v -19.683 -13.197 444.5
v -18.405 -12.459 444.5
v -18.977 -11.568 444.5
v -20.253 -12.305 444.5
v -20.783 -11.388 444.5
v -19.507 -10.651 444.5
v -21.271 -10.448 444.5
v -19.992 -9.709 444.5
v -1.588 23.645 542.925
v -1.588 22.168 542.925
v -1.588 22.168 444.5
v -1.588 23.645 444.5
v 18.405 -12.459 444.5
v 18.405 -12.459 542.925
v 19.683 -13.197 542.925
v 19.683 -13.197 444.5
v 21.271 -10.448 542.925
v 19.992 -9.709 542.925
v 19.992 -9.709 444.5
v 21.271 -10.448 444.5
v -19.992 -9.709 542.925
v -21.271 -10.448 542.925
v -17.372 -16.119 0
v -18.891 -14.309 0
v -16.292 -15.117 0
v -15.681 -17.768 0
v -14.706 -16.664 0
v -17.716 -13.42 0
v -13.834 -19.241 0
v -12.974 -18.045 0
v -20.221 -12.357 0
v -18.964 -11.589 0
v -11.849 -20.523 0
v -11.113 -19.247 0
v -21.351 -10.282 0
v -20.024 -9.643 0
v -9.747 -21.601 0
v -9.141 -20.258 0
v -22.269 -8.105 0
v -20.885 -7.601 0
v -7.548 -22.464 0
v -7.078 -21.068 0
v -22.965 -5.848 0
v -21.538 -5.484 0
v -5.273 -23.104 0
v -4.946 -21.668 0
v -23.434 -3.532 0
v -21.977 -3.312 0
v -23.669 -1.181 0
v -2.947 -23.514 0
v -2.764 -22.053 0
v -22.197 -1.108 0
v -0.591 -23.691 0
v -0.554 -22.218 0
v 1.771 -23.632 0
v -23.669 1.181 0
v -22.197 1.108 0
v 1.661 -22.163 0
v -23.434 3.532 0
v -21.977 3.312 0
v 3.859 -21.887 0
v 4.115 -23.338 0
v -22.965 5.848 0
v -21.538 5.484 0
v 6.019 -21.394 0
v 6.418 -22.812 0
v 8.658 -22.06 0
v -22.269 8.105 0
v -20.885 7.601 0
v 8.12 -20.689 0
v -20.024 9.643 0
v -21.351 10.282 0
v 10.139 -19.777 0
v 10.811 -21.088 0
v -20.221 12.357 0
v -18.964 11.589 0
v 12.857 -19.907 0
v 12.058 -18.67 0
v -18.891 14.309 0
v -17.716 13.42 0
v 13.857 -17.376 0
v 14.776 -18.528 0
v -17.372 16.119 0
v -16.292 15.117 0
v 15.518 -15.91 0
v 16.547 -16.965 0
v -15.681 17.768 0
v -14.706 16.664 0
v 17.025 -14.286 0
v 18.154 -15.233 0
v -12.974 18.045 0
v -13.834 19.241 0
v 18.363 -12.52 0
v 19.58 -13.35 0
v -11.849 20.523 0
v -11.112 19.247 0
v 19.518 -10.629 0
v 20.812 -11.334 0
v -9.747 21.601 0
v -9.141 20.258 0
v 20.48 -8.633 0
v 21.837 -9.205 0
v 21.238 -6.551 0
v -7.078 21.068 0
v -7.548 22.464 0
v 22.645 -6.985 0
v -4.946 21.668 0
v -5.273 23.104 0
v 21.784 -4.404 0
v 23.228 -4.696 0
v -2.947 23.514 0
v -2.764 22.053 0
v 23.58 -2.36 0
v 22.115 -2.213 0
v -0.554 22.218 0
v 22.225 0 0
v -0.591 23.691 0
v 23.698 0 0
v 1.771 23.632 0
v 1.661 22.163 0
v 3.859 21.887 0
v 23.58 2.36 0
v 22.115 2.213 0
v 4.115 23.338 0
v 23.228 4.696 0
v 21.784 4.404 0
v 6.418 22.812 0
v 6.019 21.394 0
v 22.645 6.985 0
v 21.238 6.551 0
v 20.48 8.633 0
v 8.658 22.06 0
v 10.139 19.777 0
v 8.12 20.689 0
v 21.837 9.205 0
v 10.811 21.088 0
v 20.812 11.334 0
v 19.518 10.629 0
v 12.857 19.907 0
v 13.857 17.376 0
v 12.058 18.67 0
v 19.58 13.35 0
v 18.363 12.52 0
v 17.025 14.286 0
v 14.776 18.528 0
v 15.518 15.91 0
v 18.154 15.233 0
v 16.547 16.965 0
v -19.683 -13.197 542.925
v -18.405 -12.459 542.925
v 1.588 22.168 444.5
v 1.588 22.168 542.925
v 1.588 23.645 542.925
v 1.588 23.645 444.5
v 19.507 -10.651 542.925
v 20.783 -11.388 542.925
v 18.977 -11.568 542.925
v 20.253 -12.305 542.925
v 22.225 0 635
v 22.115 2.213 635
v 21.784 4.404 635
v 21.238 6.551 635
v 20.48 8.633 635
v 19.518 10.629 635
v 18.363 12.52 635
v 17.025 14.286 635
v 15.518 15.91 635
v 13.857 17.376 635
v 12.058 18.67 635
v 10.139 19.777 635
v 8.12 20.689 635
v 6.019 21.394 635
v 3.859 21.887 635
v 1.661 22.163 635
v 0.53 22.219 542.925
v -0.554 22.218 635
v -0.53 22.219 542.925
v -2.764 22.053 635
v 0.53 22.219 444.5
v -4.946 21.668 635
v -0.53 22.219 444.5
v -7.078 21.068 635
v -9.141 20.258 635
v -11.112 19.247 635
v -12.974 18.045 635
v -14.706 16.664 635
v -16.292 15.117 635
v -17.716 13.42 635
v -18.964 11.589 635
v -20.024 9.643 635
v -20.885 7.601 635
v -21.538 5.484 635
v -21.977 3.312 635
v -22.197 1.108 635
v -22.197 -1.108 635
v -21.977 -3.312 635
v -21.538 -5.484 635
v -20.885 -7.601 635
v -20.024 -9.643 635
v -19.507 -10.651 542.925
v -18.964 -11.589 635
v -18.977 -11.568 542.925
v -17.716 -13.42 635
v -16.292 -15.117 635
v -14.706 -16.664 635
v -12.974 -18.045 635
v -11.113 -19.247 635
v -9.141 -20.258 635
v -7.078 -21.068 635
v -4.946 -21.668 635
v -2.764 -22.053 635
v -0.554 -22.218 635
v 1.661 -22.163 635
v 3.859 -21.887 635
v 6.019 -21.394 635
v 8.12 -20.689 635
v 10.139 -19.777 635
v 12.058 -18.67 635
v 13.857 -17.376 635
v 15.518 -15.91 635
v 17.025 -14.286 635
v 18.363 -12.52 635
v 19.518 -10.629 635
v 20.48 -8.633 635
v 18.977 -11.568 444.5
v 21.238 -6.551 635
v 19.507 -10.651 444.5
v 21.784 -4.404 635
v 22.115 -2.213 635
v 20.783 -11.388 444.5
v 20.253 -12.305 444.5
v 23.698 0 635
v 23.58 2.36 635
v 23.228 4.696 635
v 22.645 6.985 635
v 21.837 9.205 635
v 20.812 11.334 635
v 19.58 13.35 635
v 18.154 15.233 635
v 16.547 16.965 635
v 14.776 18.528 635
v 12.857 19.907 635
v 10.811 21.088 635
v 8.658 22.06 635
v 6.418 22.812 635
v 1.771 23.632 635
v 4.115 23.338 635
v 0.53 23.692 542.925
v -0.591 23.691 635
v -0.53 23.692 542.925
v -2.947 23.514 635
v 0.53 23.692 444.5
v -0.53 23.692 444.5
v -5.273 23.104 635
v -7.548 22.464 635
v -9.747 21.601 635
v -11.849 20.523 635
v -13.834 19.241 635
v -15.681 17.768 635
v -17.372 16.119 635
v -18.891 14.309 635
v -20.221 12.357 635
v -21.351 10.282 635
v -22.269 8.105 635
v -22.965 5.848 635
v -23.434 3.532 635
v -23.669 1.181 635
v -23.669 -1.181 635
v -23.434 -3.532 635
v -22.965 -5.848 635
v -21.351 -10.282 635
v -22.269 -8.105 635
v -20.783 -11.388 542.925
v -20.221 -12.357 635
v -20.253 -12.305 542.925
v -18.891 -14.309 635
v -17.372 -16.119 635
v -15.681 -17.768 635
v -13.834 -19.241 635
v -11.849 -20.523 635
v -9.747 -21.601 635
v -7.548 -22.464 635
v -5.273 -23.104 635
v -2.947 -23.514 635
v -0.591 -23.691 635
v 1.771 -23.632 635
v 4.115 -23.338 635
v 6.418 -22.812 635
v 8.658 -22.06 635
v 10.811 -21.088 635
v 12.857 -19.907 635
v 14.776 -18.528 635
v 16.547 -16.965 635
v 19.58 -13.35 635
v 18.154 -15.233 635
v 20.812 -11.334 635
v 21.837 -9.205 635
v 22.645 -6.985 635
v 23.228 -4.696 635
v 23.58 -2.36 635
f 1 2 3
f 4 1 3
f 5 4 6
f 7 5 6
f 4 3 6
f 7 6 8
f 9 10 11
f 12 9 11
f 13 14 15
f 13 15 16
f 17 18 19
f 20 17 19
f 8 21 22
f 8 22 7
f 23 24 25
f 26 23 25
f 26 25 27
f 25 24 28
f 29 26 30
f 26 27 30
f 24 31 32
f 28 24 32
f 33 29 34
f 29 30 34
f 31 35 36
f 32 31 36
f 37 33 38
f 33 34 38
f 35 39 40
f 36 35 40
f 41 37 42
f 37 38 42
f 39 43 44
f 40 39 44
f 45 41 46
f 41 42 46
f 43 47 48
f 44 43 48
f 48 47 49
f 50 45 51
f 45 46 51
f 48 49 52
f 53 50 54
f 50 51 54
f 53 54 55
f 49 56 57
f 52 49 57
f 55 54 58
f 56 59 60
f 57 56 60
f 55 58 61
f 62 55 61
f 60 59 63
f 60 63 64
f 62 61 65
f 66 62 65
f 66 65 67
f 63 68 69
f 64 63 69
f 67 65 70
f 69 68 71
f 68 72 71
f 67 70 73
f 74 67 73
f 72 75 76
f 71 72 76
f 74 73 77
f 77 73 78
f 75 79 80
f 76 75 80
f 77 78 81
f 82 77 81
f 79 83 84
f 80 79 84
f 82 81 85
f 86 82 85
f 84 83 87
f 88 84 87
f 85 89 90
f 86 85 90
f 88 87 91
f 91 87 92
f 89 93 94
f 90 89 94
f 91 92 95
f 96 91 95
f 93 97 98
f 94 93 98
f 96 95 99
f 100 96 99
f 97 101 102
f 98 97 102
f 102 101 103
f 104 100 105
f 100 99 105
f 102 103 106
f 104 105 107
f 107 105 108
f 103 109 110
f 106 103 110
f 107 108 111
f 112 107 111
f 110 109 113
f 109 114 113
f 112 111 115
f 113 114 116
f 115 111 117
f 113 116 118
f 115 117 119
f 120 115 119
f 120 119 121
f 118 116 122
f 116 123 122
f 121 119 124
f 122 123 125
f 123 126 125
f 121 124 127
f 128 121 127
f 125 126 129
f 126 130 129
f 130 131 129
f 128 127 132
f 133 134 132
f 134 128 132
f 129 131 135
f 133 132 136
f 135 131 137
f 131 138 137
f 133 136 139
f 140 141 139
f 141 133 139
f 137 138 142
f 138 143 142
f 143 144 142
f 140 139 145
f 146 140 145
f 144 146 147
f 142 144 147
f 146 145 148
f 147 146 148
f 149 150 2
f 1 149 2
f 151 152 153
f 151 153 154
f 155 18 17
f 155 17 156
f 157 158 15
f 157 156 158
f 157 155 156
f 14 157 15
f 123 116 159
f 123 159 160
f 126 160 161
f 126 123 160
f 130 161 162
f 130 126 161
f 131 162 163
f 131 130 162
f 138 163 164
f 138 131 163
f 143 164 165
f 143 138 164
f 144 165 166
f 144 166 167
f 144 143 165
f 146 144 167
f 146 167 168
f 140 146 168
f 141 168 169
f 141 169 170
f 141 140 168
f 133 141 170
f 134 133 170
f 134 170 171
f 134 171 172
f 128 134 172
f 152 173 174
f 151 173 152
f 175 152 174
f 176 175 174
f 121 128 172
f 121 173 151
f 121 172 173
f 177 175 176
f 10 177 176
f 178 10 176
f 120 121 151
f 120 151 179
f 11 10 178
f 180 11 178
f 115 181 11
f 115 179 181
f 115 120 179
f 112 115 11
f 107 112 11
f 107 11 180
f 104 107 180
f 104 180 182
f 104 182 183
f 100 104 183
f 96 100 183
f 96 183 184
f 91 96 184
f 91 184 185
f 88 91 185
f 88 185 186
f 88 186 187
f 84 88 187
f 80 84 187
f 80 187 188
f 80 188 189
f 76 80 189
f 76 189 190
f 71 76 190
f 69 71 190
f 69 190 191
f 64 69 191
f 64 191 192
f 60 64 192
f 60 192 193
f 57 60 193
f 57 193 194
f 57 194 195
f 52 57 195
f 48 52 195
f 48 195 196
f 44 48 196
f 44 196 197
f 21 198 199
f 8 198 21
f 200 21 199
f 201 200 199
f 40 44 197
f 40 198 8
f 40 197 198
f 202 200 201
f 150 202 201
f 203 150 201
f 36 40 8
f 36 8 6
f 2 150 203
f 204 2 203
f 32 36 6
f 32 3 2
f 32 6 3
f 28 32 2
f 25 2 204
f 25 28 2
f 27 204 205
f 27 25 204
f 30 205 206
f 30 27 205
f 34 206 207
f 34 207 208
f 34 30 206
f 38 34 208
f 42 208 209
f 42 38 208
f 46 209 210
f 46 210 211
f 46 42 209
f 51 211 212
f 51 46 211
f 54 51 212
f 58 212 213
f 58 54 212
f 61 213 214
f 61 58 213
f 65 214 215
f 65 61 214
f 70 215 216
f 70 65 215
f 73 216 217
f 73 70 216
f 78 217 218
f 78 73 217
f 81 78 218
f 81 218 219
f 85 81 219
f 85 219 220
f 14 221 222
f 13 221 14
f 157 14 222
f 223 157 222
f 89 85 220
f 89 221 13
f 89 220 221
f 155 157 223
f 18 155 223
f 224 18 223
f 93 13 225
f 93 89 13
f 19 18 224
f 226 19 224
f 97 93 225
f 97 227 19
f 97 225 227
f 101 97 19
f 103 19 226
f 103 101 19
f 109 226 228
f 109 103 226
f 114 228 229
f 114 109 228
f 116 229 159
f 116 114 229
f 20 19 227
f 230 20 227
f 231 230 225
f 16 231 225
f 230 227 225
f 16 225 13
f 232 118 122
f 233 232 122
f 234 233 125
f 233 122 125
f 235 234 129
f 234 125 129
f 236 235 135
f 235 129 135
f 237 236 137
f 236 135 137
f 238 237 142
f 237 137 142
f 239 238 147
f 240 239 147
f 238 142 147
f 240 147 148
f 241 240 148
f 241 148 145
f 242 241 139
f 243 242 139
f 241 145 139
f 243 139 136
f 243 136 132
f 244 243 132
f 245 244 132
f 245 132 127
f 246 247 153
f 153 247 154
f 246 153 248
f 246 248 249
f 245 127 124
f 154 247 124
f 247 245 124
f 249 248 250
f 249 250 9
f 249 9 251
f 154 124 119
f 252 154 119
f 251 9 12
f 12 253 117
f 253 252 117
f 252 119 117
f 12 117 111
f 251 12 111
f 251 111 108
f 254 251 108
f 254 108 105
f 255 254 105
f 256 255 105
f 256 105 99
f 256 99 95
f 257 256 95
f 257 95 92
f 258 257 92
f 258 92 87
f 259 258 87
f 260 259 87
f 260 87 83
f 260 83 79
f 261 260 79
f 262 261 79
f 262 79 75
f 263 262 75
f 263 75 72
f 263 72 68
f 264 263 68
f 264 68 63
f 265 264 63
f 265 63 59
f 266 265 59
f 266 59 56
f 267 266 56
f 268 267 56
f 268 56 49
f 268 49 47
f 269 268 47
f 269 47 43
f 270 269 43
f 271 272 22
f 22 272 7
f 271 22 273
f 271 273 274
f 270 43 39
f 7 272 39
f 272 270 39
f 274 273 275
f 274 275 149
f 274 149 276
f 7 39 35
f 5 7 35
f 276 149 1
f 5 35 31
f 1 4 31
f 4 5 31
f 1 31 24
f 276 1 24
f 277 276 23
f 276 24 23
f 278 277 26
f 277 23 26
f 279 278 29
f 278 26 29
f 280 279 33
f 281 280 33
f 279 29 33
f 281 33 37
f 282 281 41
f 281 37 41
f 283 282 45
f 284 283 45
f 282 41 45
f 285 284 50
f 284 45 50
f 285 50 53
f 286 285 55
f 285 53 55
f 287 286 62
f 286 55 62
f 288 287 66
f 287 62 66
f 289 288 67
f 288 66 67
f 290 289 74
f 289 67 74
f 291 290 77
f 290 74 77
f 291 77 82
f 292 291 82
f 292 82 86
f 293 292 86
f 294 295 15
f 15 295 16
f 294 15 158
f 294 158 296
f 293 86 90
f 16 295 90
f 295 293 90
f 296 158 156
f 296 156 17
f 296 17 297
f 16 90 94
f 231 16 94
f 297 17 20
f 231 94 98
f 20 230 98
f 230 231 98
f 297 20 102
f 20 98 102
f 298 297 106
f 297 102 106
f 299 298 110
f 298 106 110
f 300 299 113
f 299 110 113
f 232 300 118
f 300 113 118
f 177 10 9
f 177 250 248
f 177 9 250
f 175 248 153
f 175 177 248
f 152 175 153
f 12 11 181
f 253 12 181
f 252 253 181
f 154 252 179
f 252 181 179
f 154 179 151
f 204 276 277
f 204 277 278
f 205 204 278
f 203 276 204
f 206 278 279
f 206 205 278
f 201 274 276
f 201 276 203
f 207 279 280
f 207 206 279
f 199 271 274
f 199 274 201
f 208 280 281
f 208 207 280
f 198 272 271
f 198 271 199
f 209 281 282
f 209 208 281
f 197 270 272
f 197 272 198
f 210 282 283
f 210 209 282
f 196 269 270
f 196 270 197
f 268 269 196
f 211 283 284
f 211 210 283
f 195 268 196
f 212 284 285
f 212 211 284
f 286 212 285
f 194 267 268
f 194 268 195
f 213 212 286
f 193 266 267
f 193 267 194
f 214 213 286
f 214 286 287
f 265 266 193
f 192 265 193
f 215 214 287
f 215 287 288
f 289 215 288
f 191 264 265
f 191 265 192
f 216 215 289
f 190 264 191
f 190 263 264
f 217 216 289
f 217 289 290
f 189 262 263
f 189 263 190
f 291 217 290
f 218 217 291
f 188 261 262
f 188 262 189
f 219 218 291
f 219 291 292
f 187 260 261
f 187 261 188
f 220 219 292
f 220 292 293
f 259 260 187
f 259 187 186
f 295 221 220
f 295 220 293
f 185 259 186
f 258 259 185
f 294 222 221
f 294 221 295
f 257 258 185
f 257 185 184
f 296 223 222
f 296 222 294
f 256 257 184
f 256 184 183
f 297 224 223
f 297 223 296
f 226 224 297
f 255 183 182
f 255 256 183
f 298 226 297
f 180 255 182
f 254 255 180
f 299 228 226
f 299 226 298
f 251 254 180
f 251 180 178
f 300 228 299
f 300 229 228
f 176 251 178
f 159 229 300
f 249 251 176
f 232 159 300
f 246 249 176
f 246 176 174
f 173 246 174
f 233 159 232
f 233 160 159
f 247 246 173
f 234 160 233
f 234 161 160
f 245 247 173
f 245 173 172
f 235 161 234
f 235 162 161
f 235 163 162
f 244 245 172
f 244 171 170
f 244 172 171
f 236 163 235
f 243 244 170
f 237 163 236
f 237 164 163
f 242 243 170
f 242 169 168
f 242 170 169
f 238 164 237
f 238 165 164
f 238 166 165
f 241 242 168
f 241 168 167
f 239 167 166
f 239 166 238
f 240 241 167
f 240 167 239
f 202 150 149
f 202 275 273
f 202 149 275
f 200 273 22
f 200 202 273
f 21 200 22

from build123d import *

# Parameters (mm, degrees)
SKETCH1_R           = 23.6982
SKETCH1_R_2         = 22.225
BOSS_EXTRUDE1_DEPTH = 635
CUT_EXTRUDE1_START  = -77.831769
SKETCH2_W           = 3.175
SKETCH2_H           = 98.425
CUT_EXTRUDE1_DEPTH  = 1.529969
CIRPATTERN2_COUNT   = 3


with BuildPart() as part:
    # Sketch1 → Boss-Extrude1 (new body)
    with BuildSketch(Plane.XY):
        Circle(SKETCH1_R)
        Circle(SKETCH1_R_2, mode=Mode.SUBTRACT)
    extrude(amount=BOSS_EXTRUDE1_DEPTH)

    # Sketch2 → Cut-Extrude1 (cut)
    with BuildSketch(Plane(origin=(0, 100, 0), x_dir=(1, 0, 0), z_dir=(0, 1, 0)).offset(CUT_EXTRUDE1_START)):
        with Locations((0, -493.7125)):
            Rectangle(SKETCH2_W, SKETCH2_H)
    cut_extrude1 = extrude(amount=CUT_EXTRUDE1_DEPTH, mode=Mode.SUBTRACT)

    # CirPattern2: Cut-Extrude1 ×3 about axis
    cirpattern2_axis = Axis((0, 0, 0), (0, 0, 1))
    for i in range(1, CIRPATTERN2_COUNT):
        add(cut_extrude1.rotate(cirpattern2_axis, i * 360 / CIRPATTERN2_COUNT), mode=Mode.SUBTRACT)


solid = part.part
